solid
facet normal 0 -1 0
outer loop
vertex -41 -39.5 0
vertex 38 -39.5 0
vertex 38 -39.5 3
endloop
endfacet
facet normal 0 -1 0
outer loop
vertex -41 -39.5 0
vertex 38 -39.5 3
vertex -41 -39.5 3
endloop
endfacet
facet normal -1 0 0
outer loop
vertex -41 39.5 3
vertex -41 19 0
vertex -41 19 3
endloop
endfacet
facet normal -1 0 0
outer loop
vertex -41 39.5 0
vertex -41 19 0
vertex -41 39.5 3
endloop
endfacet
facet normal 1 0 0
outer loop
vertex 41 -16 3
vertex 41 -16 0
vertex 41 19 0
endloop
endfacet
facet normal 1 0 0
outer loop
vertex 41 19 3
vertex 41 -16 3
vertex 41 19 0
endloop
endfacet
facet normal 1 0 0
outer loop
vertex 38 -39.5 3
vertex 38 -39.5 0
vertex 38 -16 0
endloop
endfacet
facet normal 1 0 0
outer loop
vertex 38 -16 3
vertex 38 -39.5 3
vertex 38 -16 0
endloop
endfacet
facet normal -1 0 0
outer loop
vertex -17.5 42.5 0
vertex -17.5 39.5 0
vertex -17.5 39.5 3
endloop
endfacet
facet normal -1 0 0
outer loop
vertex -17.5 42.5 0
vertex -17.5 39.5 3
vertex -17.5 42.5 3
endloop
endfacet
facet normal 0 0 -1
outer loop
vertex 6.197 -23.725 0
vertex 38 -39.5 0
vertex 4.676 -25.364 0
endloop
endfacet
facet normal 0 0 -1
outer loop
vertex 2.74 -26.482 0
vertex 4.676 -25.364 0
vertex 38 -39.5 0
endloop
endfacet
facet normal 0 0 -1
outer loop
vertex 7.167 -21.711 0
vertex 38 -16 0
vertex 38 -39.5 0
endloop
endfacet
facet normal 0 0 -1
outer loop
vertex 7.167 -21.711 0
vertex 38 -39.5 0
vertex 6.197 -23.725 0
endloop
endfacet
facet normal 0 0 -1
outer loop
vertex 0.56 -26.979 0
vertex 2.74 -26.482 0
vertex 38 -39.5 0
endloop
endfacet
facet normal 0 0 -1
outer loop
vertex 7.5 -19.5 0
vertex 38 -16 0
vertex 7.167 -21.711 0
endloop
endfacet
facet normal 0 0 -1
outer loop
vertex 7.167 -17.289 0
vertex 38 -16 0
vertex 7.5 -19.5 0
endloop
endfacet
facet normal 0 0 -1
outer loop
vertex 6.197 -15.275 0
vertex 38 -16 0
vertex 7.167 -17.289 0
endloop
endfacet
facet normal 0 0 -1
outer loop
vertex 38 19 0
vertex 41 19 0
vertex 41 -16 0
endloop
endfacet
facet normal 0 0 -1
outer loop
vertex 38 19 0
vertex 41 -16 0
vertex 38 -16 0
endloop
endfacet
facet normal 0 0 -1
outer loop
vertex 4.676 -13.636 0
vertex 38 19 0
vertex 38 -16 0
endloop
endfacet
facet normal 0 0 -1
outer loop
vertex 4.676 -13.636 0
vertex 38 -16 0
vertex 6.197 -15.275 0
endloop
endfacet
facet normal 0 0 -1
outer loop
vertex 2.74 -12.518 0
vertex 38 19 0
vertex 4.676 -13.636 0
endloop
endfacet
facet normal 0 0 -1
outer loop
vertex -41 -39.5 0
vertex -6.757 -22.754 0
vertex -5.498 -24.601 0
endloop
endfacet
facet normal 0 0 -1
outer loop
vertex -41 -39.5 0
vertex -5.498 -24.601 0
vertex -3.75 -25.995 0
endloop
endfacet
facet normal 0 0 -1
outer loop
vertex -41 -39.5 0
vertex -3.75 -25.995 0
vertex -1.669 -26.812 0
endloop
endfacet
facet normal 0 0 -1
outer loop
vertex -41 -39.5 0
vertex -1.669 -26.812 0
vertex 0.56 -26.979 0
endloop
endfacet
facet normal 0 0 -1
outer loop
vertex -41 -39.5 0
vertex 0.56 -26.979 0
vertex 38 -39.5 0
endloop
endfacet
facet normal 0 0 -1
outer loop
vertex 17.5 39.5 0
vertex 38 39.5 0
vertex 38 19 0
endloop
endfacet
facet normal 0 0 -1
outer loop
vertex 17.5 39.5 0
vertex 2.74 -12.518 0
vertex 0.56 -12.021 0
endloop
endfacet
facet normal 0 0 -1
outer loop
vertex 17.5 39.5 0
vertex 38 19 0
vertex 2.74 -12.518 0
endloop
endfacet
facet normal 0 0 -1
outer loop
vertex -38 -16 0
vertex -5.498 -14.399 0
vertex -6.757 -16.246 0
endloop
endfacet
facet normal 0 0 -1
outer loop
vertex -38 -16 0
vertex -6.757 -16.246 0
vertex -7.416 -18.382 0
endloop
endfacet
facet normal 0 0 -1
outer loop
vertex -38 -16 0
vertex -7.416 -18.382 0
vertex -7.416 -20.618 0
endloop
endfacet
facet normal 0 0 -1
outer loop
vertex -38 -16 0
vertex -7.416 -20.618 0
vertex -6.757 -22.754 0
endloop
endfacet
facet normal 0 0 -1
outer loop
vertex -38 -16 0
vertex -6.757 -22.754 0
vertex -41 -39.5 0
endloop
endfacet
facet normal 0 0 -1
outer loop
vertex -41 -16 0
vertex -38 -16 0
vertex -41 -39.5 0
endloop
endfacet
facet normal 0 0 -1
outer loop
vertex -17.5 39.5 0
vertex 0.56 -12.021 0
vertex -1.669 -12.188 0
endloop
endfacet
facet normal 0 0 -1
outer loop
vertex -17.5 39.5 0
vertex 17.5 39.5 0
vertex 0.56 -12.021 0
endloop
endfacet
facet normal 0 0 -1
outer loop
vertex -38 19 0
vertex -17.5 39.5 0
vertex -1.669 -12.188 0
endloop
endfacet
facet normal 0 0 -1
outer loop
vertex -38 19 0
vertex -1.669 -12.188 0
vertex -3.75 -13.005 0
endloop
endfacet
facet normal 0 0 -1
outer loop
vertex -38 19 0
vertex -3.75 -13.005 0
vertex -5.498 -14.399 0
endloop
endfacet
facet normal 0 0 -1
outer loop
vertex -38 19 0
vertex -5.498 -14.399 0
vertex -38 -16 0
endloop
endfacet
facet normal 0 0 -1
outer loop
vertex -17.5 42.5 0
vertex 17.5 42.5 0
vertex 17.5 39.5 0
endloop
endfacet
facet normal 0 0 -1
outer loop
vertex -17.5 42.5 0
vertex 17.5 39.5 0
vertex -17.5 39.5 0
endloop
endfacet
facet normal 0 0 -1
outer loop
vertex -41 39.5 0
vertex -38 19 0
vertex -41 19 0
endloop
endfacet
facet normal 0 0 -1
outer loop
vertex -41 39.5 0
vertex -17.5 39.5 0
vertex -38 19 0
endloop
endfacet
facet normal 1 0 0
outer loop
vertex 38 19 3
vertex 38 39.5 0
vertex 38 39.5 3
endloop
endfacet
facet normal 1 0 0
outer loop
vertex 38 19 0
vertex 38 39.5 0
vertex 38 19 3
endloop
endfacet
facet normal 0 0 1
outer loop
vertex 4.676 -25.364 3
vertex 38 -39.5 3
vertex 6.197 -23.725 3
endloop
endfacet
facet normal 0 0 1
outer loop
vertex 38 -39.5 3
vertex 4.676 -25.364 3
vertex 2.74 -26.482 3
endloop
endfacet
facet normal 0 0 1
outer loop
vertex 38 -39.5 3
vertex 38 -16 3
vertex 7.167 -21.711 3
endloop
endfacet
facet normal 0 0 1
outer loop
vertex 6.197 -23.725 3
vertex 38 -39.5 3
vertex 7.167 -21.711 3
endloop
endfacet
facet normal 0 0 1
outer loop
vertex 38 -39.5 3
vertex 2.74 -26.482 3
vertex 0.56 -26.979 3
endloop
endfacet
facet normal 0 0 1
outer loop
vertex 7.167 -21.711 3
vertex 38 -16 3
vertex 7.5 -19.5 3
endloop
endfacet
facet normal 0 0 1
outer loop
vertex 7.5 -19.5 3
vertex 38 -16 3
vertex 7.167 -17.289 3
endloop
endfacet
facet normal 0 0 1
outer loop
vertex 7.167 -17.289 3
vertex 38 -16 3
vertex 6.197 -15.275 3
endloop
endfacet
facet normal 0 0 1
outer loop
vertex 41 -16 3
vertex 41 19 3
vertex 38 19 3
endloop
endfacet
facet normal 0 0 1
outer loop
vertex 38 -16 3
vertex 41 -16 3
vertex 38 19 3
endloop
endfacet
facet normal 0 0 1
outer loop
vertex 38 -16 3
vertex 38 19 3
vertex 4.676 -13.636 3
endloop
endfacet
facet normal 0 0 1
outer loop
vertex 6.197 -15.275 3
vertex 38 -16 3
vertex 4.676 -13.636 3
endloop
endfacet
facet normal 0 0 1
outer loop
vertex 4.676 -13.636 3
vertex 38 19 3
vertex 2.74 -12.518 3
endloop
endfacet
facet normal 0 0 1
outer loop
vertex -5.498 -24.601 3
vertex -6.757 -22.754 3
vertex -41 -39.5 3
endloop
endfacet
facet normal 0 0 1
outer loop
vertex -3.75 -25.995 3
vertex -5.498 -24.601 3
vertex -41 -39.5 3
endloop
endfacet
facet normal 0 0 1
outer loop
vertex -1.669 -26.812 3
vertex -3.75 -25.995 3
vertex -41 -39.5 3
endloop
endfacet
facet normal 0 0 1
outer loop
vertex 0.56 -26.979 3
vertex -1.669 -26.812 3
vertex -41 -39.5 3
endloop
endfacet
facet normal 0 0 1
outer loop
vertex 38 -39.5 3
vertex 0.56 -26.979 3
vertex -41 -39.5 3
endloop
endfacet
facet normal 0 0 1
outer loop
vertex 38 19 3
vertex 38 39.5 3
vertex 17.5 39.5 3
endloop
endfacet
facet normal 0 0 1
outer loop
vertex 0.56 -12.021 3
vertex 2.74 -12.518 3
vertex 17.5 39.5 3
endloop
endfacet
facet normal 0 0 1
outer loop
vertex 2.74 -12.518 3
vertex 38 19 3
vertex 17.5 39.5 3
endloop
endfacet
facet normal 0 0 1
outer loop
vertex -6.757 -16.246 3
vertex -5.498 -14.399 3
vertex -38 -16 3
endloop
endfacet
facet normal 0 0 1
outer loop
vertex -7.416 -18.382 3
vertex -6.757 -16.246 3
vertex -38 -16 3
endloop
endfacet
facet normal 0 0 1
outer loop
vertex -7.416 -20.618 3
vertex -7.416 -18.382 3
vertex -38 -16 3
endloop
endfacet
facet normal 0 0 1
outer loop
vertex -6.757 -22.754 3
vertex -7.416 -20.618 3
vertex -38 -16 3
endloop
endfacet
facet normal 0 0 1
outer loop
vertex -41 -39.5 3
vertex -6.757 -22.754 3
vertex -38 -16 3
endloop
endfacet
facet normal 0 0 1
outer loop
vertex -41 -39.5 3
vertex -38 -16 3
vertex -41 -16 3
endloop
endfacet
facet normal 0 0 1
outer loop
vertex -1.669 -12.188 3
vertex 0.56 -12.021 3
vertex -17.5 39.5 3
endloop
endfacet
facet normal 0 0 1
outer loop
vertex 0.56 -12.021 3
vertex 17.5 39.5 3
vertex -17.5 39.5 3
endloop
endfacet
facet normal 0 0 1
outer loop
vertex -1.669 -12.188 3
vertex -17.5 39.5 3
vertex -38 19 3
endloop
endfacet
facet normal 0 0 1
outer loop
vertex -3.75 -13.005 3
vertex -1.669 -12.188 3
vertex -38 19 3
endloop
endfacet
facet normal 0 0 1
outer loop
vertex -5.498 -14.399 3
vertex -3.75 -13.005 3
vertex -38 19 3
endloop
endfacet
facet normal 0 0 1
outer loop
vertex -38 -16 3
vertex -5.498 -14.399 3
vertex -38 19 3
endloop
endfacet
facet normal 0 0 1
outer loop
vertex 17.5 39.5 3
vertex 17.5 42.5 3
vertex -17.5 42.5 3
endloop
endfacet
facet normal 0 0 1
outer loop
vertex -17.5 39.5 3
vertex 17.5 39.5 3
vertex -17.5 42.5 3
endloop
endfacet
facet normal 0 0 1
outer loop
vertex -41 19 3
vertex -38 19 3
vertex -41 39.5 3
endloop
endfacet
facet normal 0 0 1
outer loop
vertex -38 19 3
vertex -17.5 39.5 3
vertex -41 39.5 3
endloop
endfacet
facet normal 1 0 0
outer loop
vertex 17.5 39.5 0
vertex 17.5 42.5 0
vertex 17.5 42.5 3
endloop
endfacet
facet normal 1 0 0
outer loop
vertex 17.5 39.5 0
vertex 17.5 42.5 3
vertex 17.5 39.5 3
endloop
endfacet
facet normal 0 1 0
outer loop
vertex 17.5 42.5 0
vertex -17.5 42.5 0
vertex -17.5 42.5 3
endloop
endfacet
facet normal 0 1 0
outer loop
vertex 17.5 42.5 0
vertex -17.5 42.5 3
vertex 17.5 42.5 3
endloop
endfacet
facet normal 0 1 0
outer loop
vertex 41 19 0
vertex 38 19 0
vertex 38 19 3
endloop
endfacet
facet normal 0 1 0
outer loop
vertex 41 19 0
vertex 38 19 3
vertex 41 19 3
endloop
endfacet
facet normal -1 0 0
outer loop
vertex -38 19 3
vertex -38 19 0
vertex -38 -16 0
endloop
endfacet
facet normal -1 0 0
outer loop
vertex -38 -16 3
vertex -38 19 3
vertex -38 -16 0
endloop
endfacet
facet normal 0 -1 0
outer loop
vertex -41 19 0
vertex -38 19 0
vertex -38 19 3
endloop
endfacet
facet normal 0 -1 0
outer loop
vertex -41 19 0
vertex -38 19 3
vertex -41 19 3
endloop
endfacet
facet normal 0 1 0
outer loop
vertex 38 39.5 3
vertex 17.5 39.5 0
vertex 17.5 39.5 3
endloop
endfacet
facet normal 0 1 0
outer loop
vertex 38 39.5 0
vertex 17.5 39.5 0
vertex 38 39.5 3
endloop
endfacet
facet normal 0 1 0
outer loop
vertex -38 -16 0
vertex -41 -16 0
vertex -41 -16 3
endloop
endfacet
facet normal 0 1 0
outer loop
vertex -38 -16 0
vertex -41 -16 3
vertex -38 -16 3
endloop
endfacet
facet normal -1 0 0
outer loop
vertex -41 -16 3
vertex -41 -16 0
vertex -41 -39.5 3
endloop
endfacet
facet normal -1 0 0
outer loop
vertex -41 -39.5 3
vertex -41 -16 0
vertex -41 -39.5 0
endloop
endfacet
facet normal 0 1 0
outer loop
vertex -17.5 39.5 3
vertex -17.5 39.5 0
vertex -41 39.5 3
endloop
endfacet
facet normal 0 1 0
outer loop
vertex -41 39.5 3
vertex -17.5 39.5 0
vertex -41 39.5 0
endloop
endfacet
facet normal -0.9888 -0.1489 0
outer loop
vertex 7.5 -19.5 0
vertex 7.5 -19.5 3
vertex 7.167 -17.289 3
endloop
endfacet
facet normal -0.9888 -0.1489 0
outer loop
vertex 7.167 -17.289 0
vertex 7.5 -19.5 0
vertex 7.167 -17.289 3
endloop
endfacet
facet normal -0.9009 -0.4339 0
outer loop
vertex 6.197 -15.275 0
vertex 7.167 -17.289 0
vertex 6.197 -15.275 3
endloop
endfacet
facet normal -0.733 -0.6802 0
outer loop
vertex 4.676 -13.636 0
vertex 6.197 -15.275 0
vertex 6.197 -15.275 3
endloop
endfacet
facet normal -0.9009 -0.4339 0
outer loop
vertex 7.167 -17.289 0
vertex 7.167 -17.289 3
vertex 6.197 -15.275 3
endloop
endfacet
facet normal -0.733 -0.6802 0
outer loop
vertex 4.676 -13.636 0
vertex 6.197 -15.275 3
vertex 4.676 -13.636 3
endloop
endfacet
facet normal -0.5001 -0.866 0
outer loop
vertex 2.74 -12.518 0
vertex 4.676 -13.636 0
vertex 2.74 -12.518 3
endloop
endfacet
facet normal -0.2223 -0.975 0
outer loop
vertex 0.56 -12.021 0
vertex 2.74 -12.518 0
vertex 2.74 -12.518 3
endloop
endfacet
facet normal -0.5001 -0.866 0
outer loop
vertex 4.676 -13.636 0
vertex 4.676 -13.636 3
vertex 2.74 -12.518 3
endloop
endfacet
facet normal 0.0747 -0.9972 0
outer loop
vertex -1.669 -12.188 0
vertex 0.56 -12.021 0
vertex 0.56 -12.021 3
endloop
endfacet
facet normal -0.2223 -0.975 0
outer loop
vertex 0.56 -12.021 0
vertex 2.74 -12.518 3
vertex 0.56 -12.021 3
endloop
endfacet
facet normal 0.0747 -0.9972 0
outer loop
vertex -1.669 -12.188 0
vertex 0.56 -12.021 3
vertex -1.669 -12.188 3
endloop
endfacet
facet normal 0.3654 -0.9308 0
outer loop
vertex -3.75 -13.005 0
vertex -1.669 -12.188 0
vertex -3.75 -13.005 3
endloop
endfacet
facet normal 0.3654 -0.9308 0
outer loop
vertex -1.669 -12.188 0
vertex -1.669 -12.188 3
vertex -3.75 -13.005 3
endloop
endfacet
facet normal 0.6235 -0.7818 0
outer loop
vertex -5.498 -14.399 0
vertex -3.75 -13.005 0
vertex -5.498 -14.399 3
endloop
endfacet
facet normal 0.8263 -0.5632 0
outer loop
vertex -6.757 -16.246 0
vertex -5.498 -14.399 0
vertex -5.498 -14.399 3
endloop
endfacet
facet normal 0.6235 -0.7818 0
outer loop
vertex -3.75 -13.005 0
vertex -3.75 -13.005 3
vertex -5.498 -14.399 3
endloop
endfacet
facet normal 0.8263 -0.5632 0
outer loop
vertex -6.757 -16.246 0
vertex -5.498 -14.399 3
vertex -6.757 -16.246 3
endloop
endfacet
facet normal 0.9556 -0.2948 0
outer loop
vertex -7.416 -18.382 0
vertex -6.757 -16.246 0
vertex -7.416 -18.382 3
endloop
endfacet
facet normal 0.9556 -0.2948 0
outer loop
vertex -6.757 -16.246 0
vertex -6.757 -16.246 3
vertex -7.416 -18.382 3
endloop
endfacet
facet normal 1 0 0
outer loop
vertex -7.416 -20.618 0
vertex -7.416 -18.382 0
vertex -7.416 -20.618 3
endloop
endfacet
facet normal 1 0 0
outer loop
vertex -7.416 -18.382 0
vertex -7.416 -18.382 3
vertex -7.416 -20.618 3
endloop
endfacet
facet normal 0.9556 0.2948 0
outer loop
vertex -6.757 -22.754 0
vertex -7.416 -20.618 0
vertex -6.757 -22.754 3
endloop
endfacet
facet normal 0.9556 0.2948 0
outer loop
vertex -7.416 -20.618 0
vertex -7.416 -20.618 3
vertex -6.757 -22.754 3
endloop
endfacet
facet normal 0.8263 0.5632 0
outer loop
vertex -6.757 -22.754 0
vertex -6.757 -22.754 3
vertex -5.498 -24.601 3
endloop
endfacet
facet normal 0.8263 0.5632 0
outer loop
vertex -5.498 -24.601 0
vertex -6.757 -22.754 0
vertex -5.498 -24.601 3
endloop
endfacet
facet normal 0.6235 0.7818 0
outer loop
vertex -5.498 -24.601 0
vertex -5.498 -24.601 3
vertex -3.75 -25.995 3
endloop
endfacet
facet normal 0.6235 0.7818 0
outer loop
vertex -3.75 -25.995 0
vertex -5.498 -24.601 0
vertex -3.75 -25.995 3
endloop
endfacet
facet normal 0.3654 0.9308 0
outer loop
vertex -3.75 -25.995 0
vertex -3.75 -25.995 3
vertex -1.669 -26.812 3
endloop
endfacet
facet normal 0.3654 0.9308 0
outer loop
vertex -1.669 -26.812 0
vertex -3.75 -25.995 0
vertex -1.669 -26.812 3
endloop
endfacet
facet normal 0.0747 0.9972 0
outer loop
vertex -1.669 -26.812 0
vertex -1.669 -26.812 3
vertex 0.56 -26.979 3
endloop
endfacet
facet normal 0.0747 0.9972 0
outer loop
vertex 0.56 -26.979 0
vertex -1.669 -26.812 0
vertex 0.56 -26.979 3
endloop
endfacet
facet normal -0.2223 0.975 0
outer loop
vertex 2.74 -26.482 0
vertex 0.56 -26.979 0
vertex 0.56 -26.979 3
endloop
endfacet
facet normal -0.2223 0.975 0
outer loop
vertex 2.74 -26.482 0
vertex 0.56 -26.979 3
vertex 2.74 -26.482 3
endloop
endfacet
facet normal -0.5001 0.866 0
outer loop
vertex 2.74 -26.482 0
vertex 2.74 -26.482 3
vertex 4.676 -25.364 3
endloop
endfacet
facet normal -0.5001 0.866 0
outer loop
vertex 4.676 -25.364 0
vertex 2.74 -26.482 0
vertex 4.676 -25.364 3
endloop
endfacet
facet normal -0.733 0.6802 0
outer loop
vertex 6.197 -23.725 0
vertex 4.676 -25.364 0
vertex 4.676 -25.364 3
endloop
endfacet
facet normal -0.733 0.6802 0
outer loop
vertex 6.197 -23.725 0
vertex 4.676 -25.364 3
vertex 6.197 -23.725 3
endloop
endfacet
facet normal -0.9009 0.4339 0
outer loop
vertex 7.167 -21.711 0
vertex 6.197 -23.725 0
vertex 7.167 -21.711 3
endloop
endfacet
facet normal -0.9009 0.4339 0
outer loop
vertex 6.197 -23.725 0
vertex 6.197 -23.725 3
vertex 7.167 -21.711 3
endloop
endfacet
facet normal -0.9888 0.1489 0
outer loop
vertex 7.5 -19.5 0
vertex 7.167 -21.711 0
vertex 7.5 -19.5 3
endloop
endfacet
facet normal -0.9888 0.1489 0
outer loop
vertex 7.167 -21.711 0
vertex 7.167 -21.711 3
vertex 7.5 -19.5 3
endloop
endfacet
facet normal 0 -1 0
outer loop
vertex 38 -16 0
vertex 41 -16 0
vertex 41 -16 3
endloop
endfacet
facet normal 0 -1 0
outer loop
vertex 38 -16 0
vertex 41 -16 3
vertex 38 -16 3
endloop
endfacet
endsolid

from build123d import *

# Parameters (mm, degrees)
BOSS_EXTRUDE1_DEPTH = 3
SKETCH2_R           = 7.5
CUT_EXTRUDE1_DEPTH  = 3


with BuildPart() as part:
    # Sketch1 → Boss-Extrude1 (new body)
    with BuildSketch(Plane.XY):
        Polygon((-38, 39.5), (-17.5, 39.5), (-17.5, 42.5), (17.5, 42.5), (17.5, 39.5), (38, 39.5), (38, 19), (41, 19), (41, 16), (41, -16), (38, -16), (38, -19), (38, -39.5), (-41, -39.5), (-41, -19), (-41, -16), (-38, -16), (-38, 16), (-38, 19), (-41, 19), (-41, 39.5), align=None)
    extrude(amount=BOSS_EXTRUDE1_DEPTH)

    # Sketch2 → Cut-Extrude1 (cut)
    with BuildSketch(Plane.XY.offset(3)):
        with Locations((0, -19.5)):
            Circle(SKETCH2_R)
    extrude(amount=-CUT_EXTRUDE1_DEPTH, mode=Mode.SUBTRACT)


solid = part.part
